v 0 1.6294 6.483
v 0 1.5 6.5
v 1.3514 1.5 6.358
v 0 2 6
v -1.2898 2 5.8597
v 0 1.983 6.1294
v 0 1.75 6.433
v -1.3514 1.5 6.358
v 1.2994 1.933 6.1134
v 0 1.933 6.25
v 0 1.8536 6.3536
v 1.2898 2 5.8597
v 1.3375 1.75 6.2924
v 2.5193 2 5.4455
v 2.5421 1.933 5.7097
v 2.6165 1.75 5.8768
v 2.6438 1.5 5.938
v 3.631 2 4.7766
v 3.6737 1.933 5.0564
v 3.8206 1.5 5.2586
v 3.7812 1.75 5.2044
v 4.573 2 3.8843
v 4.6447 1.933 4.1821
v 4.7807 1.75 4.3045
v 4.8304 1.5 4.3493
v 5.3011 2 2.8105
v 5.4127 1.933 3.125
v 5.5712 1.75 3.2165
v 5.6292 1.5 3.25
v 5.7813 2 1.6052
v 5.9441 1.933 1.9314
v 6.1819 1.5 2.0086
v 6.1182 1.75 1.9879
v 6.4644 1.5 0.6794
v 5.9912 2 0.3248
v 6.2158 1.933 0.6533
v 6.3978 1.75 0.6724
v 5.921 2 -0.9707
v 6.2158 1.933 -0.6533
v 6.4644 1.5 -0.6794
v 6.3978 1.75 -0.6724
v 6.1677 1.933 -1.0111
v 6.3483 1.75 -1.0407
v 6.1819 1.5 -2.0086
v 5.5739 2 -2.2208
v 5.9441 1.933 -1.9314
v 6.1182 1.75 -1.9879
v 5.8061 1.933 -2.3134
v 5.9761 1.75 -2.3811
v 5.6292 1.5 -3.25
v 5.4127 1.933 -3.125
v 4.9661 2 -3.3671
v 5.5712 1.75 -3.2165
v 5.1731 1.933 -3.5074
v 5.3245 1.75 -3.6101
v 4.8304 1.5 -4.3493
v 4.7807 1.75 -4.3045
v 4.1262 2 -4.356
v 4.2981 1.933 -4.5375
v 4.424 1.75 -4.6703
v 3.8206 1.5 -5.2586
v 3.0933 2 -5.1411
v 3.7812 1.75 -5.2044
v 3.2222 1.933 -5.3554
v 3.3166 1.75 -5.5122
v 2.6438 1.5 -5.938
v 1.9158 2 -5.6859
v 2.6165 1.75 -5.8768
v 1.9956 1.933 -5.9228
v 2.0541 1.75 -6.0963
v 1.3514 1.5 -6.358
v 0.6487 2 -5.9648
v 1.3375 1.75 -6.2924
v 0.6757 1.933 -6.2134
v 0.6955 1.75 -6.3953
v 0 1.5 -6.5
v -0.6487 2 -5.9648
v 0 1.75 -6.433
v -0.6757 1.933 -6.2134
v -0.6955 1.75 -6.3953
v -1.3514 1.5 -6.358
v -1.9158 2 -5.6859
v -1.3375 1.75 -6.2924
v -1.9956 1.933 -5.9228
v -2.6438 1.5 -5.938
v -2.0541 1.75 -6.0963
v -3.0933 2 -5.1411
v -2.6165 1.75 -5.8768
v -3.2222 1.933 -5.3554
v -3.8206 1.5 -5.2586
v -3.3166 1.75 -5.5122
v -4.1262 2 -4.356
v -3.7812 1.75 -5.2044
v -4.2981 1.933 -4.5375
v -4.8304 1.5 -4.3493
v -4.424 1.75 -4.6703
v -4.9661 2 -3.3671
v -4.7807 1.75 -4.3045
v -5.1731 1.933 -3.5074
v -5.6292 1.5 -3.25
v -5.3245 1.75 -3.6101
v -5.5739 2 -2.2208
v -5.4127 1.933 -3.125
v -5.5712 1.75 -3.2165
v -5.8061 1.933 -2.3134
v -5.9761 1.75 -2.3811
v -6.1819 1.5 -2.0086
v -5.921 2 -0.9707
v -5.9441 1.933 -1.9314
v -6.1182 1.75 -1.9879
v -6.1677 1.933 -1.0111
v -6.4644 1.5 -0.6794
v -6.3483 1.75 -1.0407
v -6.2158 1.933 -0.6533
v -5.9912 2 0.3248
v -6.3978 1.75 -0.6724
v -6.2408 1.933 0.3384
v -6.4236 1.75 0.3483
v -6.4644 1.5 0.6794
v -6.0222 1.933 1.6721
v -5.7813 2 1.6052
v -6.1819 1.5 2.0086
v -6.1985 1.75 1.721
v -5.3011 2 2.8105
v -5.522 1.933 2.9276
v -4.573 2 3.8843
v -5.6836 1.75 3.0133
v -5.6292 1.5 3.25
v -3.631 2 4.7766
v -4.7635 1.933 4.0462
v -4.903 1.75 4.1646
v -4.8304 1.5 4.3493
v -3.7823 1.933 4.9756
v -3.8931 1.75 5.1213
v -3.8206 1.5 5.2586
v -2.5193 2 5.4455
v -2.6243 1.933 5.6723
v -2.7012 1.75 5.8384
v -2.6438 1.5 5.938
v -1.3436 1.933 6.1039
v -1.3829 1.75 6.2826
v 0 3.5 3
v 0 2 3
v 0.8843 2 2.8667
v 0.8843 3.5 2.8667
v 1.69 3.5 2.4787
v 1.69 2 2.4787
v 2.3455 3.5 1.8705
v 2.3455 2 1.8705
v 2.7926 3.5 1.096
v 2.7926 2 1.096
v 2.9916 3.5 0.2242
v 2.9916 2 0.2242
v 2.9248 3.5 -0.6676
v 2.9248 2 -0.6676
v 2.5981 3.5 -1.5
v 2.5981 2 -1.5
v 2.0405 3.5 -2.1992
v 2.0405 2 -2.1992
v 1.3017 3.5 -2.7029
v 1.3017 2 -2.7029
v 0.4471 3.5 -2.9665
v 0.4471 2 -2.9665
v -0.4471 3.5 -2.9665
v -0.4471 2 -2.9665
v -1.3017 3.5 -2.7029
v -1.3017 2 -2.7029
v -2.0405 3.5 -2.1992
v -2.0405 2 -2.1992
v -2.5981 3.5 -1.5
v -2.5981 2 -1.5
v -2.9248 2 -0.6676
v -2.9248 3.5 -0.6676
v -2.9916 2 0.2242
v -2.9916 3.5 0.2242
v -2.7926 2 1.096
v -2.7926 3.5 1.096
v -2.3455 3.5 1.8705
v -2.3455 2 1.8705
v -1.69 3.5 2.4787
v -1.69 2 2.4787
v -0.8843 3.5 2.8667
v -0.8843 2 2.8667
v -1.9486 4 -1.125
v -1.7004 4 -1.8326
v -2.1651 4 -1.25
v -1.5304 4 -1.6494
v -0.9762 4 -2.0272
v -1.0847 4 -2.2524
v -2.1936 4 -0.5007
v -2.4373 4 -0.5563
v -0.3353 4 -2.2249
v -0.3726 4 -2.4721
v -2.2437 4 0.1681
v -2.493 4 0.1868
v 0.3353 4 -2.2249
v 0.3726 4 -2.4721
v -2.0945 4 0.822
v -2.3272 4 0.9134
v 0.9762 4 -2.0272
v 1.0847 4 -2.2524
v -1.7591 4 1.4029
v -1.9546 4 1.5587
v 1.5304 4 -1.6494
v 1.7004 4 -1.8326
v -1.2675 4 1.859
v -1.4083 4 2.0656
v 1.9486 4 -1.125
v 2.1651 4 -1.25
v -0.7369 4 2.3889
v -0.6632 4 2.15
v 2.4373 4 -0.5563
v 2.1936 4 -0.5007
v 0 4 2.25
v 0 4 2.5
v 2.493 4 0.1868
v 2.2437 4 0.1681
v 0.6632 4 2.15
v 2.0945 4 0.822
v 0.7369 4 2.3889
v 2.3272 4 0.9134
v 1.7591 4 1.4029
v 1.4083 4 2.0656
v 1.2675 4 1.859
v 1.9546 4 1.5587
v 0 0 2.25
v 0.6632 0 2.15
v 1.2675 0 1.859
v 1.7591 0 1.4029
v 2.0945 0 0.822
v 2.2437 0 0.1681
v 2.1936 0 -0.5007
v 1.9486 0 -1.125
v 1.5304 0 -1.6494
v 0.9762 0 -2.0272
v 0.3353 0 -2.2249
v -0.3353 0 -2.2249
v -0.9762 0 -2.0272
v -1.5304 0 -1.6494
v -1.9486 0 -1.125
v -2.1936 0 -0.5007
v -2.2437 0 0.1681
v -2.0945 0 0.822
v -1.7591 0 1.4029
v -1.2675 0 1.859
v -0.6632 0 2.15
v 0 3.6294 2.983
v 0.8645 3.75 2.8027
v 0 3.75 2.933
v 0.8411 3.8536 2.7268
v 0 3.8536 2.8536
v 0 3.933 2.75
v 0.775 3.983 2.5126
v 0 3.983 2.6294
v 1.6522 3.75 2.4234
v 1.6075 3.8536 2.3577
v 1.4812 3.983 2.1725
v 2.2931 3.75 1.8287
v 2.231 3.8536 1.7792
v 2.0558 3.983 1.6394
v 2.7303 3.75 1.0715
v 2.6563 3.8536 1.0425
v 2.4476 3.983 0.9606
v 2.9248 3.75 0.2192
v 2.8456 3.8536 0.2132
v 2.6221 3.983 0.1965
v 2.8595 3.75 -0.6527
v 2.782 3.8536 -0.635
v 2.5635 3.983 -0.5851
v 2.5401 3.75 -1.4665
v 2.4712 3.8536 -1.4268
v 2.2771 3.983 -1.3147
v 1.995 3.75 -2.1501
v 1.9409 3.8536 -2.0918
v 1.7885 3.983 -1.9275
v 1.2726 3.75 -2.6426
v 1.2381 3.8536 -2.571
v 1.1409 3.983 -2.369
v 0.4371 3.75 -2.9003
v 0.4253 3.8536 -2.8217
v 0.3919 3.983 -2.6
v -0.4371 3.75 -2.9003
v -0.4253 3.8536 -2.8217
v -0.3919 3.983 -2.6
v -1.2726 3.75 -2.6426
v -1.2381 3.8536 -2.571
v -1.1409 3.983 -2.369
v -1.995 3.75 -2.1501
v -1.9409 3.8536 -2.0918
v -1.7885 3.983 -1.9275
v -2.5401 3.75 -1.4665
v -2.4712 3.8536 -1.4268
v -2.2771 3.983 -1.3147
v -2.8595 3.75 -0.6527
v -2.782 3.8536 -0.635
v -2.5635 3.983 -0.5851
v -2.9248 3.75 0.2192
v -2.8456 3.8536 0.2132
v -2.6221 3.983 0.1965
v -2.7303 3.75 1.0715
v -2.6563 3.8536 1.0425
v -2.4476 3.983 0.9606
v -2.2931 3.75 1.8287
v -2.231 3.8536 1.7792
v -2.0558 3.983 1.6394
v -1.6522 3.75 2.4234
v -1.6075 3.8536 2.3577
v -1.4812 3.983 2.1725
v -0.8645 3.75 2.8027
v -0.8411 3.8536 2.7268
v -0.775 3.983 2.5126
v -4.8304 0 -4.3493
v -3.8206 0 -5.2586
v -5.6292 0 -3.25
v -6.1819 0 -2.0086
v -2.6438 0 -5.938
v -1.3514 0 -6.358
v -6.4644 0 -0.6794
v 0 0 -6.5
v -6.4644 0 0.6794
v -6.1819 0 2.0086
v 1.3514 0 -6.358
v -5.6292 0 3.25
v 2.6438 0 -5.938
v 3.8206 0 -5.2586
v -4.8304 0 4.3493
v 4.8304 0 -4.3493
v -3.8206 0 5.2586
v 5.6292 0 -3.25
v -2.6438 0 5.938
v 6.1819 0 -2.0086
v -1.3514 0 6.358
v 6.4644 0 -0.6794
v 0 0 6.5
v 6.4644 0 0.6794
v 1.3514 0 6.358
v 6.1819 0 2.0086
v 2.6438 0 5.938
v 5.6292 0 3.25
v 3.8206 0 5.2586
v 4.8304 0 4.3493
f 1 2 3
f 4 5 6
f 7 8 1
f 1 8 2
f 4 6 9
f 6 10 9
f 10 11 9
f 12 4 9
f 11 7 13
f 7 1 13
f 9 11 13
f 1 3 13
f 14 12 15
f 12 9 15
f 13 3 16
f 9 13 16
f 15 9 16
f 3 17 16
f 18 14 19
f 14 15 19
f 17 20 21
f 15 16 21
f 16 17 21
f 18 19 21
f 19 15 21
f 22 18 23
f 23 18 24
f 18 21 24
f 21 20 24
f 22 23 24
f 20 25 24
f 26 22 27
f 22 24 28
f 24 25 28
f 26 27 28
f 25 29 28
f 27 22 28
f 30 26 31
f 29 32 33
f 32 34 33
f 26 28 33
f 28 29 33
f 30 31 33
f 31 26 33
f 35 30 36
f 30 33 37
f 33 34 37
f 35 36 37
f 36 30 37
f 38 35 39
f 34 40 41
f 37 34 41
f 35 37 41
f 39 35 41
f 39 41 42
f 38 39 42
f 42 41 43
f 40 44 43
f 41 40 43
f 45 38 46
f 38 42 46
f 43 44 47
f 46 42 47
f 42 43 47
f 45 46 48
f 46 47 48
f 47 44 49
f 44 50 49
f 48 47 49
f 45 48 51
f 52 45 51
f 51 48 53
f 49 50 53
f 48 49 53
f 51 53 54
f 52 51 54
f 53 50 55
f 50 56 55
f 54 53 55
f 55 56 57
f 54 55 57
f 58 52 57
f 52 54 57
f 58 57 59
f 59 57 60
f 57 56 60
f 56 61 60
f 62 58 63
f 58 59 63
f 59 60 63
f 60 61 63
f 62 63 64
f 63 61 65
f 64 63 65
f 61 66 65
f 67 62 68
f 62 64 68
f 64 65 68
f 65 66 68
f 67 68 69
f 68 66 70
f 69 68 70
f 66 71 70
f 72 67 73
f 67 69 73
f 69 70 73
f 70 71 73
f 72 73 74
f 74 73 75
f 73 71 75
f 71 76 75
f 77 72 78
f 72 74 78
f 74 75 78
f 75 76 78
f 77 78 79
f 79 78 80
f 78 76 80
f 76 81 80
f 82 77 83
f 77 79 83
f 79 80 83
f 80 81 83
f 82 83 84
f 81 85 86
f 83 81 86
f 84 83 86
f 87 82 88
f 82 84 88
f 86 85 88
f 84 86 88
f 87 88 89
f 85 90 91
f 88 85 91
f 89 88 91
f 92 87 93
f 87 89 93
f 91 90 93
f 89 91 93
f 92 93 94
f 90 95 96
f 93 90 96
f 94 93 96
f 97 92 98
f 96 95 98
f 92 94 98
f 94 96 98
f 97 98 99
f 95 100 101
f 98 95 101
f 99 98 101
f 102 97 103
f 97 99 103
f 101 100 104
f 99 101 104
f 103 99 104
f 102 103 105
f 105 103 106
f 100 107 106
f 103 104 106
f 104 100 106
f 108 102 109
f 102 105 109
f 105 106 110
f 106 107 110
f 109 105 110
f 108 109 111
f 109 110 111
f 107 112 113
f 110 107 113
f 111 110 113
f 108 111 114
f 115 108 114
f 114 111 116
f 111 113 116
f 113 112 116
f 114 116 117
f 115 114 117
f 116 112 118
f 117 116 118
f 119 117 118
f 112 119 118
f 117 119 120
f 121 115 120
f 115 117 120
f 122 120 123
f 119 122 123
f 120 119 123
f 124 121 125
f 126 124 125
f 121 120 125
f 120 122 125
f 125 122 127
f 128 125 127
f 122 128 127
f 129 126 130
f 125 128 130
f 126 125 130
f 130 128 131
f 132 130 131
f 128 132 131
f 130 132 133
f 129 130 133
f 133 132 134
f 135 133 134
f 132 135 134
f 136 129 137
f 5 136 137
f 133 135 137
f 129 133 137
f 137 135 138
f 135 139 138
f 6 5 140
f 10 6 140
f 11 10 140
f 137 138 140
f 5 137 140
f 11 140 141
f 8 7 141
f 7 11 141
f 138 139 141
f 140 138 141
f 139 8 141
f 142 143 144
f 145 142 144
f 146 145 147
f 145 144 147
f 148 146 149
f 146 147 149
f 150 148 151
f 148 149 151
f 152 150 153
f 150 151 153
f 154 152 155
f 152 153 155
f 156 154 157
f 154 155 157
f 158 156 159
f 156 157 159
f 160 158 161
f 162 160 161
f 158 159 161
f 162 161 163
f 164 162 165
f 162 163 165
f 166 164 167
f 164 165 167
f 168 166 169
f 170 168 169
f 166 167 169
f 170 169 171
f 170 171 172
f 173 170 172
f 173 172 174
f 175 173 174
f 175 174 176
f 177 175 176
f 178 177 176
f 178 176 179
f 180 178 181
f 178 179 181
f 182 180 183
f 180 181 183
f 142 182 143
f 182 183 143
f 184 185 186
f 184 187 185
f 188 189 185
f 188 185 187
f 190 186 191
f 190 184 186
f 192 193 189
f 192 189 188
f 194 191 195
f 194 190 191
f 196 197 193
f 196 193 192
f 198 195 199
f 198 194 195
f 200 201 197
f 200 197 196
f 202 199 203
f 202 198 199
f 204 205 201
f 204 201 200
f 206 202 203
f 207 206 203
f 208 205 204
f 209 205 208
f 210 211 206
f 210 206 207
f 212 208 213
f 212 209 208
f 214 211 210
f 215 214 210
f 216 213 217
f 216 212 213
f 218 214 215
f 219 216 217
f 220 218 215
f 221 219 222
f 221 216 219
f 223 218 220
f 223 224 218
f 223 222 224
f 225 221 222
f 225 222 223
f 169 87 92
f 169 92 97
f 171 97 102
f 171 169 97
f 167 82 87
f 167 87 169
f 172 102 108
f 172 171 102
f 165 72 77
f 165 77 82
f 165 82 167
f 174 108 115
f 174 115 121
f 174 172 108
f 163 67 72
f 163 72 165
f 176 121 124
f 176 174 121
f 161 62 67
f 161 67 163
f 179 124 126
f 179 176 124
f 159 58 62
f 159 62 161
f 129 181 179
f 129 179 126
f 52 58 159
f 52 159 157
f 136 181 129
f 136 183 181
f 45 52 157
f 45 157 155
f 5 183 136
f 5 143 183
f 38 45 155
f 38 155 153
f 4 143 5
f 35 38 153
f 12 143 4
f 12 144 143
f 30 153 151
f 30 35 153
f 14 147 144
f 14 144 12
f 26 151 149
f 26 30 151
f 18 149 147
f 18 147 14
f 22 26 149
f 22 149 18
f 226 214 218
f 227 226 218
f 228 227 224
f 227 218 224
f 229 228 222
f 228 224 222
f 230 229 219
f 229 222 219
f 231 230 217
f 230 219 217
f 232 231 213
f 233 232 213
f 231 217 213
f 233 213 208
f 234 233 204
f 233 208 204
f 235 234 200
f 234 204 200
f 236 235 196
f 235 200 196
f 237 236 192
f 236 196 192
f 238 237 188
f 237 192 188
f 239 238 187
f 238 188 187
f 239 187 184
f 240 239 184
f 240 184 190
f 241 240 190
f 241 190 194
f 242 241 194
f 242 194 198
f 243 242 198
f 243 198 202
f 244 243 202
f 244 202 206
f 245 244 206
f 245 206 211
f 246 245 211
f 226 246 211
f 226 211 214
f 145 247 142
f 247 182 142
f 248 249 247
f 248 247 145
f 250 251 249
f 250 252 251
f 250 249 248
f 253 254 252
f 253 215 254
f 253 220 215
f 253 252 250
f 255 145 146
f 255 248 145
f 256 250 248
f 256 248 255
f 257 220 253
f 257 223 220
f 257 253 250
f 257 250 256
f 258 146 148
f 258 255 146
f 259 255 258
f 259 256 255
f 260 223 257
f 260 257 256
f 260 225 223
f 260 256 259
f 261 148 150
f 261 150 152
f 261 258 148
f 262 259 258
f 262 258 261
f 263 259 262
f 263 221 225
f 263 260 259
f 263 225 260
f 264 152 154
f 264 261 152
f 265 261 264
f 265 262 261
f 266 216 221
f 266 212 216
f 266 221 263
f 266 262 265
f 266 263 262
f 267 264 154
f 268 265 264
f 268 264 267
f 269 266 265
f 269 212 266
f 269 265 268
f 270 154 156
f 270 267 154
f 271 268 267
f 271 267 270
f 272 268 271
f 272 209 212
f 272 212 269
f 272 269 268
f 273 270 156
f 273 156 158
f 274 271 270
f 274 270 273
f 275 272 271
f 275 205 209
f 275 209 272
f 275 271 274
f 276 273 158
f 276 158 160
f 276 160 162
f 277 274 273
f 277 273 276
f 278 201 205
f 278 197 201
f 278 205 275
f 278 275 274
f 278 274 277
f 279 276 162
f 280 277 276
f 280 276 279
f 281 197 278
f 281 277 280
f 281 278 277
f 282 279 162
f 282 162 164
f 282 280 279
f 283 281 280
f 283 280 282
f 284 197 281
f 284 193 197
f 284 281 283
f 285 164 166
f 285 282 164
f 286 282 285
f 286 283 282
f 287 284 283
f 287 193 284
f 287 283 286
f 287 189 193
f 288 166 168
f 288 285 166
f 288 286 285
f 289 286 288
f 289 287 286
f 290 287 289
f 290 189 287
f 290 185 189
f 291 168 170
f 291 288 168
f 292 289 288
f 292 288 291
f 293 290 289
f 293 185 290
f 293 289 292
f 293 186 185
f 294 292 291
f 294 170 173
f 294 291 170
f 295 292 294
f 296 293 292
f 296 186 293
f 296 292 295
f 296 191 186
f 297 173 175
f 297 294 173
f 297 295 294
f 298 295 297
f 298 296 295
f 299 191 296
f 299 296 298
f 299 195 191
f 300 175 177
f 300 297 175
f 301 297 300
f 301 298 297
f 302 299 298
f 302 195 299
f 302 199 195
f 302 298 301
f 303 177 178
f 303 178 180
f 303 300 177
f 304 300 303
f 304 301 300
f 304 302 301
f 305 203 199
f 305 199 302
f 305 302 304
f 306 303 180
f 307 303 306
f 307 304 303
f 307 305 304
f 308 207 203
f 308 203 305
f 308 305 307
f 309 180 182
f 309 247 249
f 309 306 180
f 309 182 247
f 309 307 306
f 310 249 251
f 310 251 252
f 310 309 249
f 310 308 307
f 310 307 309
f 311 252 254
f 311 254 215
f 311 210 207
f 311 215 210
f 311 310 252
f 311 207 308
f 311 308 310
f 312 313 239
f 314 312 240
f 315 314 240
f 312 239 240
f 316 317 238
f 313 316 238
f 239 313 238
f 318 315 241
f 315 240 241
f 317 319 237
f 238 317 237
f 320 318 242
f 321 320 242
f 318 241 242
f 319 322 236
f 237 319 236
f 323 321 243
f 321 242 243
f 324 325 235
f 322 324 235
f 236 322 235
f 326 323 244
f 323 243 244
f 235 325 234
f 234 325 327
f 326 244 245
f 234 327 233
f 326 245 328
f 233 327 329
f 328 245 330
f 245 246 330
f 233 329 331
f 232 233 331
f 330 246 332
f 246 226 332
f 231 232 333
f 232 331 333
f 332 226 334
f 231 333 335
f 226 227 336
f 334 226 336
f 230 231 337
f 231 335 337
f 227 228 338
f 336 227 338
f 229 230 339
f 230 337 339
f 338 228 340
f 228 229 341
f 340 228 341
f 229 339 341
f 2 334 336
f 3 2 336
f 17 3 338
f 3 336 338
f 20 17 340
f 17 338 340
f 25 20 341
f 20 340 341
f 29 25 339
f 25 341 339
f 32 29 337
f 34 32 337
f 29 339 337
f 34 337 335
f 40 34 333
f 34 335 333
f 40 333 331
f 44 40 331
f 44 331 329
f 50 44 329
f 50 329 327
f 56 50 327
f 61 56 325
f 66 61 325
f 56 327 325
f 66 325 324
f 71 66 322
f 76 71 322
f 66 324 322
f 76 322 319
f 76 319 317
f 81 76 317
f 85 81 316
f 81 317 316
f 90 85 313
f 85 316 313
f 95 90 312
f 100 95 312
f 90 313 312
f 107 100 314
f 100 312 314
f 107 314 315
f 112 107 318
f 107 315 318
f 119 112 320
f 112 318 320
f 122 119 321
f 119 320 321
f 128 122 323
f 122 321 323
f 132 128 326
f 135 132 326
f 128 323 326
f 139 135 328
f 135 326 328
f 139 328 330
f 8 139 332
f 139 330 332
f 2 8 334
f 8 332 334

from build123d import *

# Parameters (mm, degrees)
SKETCH_1_R          = 6.5
EXTRUDE_1_DEPTH     = 2
SKETCH_2_R          = 3
EXTRUDE_2_DEPTH     = 2
SKETCH_3_R          = 2.25
CUT_EXTRUDE_1_DEPTH = 10
FILLET_2_R          = 0.5
FILLET_3_R          = 0.5


with BuildPart() as part:
    # 草图1 → 凸台-拉伸1 (new body)
    with BuildSketch(Plane(origin=(0, 0, 0), x_dir=(1, 0, 0), z_dir=(0, 1, 0))):
        with Locations(Location((0, 0, 0), (0, 0, 270))):
            Circle(SKETCH_1_R)
    extrude(amount=EXTRUDE_1_DEPTH)

    # 草图2 → 凸台-拉伸2 (add)
    with BuildSketch(Plane(origin=(0, 2, 0), x_dir=(1, 0, 0), z_dir=(0, 1, 0))):
        with Locations(Location((0, 0, 0), (0, 0, 270))):
            Circle(SKETCH_2_R)
    extrude(amount=EXTRUDE_2_DEPTH)

    # 草图3 → 切除-拉伸1 (cut)
    with BuildSketch(Plane(origin=(0, 4, 0), x_dir=(1, 0, 0), z_dir=(0, 1, 0))):
        with Locations(Location((0, 0, 0), (0, 0, 270))):
            Circle(SKETCH_3_R)
    extrude(amount=-CUT_EXTRUDE_1_DEPTH, mode=Mode.SUBTRACT)

    # 圆角2
    fillet_2_edges = [part.edges().sort_by_distance(p)[0] for p in [
        (0, 4, -3),
    ]]
    fillet(fillet_2_edges, radius=FILLET_2_R)

    # 圆角3
    fillet_3_edges = [part.edges().sort_by_distance(p)[0] for p in [
        (0, 2, -6.5),
    ]]
    fillet(fillet_3_edges, radius=FILLET_3_R)


solid = part.part
